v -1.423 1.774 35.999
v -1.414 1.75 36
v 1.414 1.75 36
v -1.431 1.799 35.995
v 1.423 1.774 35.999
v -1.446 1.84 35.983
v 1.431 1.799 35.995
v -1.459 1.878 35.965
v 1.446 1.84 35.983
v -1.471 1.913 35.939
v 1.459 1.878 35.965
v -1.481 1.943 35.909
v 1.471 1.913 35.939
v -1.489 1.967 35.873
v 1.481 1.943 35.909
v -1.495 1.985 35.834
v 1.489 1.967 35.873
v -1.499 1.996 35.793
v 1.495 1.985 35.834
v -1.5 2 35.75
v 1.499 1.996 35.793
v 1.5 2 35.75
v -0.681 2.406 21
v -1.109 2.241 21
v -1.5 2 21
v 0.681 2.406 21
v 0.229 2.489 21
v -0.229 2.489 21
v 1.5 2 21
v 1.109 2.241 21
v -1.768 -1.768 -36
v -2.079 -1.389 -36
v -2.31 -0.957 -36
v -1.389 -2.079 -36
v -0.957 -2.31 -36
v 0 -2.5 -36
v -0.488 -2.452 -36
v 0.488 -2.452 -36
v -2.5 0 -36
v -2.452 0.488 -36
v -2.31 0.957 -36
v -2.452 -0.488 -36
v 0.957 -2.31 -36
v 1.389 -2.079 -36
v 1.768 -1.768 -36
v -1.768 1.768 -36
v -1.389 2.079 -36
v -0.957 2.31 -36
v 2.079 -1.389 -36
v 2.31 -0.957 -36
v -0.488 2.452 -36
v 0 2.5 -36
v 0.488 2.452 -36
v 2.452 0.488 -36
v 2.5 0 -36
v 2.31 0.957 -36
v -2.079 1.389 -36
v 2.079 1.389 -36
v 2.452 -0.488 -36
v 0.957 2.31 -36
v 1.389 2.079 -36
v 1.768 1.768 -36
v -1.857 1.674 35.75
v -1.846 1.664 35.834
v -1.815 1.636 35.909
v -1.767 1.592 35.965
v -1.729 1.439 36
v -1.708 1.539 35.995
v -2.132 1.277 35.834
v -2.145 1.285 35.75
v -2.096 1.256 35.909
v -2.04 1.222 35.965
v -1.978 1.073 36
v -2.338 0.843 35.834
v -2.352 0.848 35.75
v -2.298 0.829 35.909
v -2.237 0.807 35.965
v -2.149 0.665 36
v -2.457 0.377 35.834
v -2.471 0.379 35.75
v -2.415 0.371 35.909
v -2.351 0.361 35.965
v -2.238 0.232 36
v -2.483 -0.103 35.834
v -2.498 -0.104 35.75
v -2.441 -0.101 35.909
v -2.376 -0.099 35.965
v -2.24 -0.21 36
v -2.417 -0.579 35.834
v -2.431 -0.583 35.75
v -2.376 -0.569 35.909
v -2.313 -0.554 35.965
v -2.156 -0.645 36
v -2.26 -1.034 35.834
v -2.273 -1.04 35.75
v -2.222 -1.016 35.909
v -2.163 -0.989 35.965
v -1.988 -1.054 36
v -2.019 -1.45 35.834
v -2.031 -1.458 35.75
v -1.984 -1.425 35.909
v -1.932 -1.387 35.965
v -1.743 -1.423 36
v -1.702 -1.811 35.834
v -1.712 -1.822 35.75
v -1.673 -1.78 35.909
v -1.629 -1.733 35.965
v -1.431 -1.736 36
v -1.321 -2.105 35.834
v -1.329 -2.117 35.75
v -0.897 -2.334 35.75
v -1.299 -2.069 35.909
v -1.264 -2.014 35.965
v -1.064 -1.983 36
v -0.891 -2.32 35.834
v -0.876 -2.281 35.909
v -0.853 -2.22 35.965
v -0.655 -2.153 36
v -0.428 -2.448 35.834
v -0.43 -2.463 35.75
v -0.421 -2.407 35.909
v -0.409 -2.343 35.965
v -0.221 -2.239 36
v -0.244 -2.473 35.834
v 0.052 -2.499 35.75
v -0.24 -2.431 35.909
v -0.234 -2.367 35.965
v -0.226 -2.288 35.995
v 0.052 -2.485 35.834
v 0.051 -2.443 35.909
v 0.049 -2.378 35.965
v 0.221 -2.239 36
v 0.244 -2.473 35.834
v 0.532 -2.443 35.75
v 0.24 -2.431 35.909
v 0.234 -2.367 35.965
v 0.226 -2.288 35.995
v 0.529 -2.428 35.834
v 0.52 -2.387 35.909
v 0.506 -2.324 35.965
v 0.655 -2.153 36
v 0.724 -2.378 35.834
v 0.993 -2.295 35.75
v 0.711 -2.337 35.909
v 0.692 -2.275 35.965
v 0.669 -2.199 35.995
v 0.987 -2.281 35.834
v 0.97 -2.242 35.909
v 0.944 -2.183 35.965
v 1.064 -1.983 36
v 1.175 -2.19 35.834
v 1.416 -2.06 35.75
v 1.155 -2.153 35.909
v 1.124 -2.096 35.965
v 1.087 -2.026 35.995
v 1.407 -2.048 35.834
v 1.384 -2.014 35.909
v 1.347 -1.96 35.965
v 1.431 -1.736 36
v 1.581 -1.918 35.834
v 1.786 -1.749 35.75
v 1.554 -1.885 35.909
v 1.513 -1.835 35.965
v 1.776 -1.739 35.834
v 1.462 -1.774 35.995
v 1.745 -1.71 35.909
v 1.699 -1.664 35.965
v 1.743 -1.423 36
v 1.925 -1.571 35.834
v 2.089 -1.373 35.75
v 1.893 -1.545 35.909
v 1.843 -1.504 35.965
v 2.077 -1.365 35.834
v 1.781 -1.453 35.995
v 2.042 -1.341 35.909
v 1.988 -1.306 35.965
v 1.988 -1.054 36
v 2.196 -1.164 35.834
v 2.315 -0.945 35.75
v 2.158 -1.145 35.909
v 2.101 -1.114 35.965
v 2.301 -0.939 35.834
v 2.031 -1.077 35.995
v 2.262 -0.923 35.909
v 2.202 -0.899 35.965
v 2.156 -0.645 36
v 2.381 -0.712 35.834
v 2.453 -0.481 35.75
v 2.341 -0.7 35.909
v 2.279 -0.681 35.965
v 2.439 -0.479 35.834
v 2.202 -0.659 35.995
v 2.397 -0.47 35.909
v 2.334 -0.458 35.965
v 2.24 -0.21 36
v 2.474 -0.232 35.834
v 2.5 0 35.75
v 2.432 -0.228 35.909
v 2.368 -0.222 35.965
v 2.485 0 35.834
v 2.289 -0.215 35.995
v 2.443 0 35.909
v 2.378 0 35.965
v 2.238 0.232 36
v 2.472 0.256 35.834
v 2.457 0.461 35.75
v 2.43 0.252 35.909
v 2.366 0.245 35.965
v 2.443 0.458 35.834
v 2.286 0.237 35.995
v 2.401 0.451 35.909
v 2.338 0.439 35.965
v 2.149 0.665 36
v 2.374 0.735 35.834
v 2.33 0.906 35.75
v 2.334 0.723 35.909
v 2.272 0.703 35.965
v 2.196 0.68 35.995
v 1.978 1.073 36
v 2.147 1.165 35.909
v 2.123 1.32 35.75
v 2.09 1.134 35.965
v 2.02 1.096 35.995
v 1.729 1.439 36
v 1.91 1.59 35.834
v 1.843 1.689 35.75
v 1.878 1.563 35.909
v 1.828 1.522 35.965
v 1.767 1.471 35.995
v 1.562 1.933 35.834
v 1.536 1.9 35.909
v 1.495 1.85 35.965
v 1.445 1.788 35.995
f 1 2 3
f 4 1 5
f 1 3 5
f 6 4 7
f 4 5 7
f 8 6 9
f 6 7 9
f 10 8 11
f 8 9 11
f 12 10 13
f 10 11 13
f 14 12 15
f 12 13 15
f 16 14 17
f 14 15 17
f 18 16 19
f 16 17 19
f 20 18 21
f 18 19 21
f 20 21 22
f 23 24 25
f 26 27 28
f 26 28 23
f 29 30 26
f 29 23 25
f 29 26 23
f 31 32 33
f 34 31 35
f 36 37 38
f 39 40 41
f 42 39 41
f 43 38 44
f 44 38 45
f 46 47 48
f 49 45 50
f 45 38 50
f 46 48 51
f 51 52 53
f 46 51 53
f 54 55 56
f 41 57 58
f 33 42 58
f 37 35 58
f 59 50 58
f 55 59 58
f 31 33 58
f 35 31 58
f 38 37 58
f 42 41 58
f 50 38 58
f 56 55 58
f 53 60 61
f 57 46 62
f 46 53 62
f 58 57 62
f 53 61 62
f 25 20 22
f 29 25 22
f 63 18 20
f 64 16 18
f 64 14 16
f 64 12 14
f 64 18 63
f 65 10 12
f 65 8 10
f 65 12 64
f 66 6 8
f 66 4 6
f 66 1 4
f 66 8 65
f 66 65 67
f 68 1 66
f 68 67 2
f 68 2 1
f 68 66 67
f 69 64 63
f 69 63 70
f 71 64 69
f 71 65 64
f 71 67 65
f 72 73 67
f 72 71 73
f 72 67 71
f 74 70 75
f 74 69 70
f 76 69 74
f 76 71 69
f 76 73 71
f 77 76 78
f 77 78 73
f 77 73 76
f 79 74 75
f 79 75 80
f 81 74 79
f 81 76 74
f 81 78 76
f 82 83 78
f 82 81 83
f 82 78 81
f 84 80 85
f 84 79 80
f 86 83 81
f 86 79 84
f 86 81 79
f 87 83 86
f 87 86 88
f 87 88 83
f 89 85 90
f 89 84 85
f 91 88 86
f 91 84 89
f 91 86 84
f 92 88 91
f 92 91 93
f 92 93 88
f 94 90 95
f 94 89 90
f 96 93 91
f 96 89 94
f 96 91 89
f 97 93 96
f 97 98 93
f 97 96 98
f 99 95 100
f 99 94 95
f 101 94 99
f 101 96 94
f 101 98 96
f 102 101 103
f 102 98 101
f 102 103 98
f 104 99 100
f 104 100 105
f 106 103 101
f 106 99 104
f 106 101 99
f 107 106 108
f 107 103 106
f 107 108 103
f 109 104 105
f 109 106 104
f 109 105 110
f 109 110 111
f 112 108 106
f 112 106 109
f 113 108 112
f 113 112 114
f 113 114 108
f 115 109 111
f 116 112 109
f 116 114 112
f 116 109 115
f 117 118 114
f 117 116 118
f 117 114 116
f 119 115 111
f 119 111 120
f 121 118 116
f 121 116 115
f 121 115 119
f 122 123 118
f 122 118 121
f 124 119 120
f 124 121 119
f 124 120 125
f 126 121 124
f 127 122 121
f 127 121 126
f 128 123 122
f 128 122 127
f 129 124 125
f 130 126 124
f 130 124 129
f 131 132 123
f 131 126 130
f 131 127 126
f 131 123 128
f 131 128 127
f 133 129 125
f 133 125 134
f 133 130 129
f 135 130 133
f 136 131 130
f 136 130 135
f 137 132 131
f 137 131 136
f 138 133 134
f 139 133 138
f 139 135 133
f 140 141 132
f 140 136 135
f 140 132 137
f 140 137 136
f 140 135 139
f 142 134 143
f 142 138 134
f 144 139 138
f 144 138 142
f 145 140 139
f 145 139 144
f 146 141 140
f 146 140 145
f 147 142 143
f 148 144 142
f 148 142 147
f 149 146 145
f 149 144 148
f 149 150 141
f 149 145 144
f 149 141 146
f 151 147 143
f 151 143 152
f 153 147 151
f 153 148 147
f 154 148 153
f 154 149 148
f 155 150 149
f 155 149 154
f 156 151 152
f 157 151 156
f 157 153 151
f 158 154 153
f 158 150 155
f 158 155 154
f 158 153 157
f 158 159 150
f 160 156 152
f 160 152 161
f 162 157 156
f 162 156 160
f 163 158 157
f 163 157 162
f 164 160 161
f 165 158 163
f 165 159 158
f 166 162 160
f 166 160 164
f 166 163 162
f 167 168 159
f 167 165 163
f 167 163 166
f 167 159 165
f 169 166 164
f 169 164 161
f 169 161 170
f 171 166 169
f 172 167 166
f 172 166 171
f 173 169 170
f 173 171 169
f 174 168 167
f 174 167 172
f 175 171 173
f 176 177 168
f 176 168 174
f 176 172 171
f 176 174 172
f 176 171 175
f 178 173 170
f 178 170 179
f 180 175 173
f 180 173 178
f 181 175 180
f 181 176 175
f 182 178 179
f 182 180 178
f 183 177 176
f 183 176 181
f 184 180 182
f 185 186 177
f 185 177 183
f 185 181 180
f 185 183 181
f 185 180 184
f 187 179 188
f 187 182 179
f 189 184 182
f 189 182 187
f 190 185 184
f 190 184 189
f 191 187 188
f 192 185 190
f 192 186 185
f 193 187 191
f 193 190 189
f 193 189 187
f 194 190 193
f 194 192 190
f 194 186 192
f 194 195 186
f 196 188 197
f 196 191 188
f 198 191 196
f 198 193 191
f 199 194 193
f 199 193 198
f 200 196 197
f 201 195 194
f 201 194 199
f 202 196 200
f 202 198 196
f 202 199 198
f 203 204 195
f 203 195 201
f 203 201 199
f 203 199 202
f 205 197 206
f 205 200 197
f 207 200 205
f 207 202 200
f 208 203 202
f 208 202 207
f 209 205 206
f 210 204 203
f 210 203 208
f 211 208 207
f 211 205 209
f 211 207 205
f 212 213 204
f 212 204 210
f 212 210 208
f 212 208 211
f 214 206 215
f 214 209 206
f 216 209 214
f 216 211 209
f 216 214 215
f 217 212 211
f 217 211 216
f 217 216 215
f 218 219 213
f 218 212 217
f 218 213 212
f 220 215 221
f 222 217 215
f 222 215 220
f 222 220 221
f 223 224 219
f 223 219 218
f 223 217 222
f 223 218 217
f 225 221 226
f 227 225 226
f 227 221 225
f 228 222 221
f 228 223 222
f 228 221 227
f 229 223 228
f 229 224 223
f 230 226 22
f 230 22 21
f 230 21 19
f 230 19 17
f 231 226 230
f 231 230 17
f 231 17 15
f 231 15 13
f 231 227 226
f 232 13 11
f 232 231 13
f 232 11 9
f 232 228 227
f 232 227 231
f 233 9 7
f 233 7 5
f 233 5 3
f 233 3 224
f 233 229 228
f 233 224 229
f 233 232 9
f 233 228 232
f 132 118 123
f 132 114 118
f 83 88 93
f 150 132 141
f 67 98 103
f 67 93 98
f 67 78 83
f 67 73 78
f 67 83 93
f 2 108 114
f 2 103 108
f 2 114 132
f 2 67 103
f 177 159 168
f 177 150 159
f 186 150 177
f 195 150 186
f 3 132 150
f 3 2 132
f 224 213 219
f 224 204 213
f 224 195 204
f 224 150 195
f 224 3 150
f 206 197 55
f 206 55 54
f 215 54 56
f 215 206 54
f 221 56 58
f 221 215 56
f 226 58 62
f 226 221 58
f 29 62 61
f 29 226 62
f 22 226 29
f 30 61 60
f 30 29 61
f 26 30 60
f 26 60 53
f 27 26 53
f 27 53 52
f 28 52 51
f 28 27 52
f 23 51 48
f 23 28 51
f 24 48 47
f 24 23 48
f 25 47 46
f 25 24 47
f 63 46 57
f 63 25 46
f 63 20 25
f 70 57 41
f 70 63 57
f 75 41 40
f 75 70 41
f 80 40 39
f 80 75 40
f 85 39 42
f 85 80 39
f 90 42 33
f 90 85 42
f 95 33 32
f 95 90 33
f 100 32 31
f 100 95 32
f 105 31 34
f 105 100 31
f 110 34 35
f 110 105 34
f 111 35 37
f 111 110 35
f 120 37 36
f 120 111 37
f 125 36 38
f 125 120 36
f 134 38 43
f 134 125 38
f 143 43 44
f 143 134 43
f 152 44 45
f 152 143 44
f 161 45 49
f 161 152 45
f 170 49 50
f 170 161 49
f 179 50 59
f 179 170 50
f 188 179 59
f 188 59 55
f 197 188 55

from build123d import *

# Parameters (mm, degrees)
SKETCH1_R        = 2.5
SHAFT_BODY_DEPTH = 36
D_CUT_DEPTH      = 15
FILLET_2_R       = 0.25


with BuildPart() as part:
    # Sketch1 → Shaft Body (new body, symmetric)
    with BuildSketch(Plane.XY):
        Circle(SKETCH1_R)
    extrude(amount=SHAFT_BODY_DEPTH, both=True)

    # Sketch2 → D Cut (cut)
    with BuildSketch(Plane.XY.offset(36)):
        with BuildLine():
            Line((-1.5, 2), (1.5, 2))
            ThreePointArc((1.5, 2), (0, 2.5), (-1.5, 2))
        make_face()
    extrude(amount=-D_CUT_DEPTH, mode=Mode.SUBTRACT)

    # Fillet 2
    fillet_2_edges = [part.edges().sort_by_distance(p)[0] for p in [
        (-1.118033989, -2.236067977, 36),
        (0, 2, 36),
    ]]
    fillet(fillet_2_edges, radius=FILLET_2_R)


solid = part.part
